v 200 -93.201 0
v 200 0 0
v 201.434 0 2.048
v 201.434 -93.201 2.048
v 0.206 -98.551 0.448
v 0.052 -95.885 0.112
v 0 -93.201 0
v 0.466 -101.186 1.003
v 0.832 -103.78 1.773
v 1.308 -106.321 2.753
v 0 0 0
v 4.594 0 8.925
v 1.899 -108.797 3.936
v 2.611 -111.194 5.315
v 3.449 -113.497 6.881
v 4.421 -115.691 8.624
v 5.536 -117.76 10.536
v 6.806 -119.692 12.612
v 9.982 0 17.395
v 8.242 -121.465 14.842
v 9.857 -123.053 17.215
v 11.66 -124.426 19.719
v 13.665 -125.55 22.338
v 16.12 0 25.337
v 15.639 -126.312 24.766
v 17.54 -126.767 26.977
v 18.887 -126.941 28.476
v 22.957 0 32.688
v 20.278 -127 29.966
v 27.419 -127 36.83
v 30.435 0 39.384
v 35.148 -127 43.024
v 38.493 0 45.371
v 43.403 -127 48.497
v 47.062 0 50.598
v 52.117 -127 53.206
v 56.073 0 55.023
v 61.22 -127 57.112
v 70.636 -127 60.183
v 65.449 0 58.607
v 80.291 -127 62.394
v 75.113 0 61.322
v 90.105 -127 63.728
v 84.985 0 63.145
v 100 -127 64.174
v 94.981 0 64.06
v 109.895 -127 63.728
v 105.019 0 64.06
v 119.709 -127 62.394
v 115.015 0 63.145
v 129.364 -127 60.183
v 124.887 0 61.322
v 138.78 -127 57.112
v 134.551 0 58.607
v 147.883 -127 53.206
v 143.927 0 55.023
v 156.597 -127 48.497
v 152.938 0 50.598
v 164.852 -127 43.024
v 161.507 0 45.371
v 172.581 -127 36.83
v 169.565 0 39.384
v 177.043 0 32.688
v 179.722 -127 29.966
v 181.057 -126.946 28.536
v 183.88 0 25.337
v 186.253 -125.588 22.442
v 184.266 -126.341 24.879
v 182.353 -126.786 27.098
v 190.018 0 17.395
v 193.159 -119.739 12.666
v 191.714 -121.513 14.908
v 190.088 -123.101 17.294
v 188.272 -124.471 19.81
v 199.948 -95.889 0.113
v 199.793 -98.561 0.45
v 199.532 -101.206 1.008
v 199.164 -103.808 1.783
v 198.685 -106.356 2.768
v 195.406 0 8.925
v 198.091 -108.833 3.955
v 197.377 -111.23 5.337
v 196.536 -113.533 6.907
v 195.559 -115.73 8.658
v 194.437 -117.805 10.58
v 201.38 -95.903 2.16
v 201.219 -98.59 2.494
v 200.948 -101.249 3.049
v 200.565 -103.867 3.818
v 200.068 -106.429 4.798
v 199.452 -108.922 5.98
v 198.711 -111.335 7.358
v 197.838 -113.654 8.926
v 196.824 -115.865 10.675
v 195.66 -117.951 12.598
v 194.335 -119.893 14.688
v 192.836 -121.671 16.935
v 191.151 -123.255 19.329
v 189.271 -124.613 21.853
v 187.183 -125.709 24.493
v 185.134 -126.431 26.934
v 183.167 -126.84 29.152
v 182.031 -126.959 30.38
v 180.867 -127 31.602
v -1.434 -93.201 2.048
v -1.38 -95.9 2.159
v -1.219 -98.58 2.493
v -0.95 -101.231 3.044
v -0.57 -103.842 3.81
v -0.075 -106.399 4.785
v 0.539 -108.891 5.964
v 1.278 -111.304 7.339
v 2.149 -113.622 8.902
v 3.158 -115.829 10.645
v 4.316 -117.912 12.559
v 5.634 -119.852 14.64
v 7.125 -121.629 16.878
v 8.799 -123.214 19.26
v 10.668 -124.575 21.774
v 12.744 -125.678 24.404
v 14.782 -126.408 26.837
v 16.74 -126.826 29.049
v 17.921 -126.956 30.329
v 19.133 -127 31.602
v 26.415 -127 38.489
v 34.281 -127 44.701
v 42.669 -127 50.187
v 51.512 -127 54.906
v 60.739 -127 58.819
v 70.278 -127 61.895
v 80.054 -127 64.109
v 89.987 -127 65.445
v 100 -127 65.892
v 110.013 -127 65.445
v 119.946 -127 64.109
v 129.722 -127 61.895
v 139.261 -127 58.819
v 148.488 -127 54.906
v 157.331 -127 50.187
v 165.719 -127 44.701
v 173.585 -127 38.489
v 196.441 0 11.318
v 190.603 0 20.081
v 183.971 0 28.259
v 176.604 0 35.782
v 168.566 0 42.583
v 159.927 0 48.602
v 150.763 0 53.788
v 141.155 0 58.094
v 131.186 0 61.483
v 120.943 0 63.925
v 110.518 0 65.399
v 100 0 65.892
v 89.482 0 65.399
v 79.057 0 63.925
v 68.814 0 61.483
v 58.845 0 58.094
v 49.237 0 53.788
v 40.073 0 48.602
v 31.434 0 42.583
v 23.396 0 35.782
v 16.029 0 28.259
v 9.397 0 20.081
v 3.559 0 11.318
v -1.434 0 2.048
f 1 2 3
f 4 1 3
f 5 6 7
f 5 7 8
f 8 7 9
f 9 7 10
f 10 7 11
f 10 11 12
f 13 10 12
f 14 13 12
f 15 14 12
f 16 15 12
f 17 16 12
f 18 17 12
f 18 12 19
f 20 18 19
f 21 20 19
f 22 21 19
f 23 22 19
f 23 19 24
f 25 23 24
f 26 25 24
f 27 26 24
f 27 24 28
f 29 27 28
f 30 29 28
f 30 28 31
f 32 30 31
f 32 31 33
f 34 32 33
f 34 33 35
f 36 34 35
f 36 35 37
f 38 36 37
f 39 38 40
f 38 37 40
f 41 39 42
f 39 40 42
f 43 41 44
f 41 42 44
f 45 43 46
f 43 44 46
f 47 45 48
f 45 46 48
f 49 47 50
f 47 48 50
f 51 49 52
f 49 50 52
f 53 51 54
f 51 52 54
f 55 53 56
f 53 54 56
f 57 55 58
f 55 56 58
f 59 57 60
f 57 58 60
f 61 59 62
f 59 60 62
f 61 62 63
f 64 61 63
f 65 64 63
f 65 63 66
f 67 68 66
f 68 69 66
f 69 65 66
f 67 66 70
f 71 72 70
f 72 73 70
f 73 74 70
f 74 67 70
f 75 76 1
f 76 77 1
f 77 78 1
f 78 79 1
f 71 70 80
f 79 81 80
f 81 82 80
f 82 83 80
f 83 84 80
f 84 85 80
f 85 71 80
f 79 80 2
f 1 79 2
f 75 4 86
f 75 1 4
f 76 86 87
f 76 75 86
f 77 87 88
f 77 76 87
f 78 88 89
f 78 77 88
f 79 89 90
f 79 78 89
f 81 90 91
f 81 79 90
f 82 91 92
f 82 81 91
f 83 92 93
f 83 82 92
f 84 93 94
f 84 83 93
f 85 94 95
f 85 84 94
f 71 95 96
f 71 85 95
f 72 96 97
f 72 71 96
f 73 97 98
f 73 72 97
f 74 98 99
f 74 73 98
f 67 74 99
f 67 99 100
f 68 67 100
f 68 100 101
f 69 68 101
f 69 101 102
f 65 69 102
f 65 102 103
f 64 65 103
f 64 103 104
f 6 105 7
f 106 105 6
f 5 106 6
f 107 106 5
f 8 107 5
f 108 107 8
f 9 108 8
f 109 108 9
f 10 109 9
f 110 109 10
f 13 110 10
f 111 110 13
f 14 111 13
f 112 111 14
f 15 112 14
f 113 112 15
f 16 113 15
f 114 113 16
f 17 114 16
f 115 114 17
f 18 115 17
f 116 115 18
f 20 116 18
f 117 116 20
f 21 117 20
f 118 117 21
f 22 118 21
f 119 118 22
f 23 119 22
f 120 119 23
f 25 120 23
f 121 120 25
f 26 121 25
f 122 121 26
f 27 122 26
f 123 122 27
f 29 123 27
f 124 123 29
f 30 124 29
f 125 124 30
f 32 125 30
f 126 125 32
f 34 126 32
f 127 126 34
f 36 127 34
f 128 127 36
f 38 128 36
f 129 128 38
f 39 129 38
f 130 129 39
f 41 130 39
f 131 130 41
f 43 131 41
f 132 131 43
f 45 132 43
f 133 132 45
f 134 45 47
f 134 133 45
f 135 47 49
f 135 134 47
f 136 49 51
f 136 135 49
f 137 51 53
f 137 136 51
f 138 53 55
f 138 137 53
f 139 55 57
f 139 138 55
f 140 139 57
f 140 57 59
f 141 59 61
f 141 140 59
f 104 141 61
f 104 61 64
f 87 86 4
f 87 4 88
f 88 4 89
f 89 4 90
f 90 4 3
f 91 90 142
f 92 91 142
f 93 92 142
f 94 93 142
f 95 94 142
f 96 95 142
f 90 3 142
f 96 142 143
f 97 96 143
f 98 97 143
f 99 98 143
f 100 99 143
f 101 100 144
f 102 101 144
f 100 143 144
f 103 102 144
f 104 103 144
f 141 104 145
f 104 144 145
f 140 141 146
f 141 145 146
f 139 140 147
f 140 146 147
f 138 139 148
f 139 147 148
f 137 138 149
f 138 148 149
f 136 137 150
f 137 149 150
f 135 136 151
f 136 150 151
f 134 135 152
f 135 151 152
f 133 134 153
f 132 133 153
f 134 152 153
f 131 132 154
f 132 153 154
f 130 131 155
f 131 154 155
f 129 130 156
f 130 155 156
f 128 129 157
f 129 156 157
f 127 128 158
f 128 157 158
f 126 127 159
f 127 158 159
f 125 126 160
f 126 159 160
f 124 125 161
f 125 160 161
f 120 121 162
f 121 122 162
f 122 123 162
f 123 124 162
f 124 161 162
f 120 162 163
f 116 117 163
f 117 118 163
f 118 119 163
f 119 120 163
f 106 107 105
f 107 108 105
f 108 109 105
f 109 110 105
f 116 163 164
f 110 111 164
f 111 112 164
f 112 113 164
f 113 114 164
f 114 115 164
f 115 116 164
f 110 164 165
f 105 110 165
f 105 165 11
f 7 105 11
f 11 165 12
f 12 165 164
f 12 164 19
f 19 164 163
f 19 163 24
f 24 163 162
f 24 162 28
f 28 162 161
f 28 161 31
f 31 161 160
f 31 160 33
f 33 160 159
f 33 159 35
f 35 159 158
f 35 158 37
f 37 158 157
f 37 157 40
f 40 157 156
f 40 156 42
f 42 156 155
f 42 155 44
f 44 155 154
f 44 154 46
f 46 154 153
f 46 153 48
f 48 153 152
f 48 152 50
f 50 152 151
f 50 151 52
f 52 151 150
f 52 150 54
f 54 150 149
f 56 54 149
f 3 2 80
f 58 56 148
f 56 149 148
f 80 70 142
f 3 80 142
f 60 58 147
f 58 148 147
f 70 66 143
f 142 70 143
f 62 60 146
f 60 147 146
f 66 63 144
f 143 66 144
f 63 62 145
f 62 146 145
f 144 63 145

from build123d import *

# Parameters (mm, degrees)
F1_DEPTH    = 127
F2_T1_DEPTH = 340.4898987322
F2_T3_DEPTH = 340.4898987322


# Not quite as in the source:
# - a fillet or chamfer that OpenCascade refuses, or shapes differently, is made with other operations: its cross-section is extruded or revolved along the edge and cut away or added


with BuildPart() as f1:
    # F0 (on Front) → F1 (new body)
    with BuildSketch(Plane.XZ):
        with BuildLine():
            ThreePointArc((0, 0), (100, 64.1742430504), (200, 0))
            Line((200, 0), (201.4339410909, 2.0478801107))
            ThreePointArc((201.4339410909, 2.0478801107), (100, 65.8918877277), (-1.4339410909, 2.0478801107))
            Line((-1.4339410909, 2.0478801107), (0, 0))
        make_face()
    extrude(amount=F1_DEPTH)

    # F2: fillet of radius 33.7989898732 on 2 edges, made by hand

    # F2_s2 → F2_t1 (cut)
    with BuildSketch(Plane(origin=(-79.5992955607, 0, -113.6795752931), x_dir=(0, 1, 0), z_dir=(0.5735764364, 0, 0.8191520443))):
        with BuildLine():
            ThreePointArc((-93.2010101268, -163.8304088578), (-117.1005050634, -153.9309139212), (-127, -130.0314189846))
            Line((-127, -130.0314189846), (-127, -163.8304088578))
            Line((-127, -163.8304088578), (-93.2010101268, -163.8304088578))
        make_face()
    extrude(amount=F2_T1_DEPTH, mode=Mode.SUBTRACT)

    # F2_s4 → F2_t3 (cut)
    with BuildSketch(Plane(origin=(-49.8997015002, 0, 71.2641592346), x_dir=(0, 1, 0), z_dir=(0.5735764364, 0, -0.8191520443))):
        with BuildLine():
            ThreePointArc((-93.2010101268, 0), (-117.1005050634, 9.8994949366), (-127, 33.7989898732))
            Line((-127, 33.7989898732), (-127, 0))
            Line((-127, 0), (-93.2010101268, 0))
        make_face()
    extrude(amount=F2_T3_DEPTH, mode=Mode.SUBTRACT)


solid = f1.part
